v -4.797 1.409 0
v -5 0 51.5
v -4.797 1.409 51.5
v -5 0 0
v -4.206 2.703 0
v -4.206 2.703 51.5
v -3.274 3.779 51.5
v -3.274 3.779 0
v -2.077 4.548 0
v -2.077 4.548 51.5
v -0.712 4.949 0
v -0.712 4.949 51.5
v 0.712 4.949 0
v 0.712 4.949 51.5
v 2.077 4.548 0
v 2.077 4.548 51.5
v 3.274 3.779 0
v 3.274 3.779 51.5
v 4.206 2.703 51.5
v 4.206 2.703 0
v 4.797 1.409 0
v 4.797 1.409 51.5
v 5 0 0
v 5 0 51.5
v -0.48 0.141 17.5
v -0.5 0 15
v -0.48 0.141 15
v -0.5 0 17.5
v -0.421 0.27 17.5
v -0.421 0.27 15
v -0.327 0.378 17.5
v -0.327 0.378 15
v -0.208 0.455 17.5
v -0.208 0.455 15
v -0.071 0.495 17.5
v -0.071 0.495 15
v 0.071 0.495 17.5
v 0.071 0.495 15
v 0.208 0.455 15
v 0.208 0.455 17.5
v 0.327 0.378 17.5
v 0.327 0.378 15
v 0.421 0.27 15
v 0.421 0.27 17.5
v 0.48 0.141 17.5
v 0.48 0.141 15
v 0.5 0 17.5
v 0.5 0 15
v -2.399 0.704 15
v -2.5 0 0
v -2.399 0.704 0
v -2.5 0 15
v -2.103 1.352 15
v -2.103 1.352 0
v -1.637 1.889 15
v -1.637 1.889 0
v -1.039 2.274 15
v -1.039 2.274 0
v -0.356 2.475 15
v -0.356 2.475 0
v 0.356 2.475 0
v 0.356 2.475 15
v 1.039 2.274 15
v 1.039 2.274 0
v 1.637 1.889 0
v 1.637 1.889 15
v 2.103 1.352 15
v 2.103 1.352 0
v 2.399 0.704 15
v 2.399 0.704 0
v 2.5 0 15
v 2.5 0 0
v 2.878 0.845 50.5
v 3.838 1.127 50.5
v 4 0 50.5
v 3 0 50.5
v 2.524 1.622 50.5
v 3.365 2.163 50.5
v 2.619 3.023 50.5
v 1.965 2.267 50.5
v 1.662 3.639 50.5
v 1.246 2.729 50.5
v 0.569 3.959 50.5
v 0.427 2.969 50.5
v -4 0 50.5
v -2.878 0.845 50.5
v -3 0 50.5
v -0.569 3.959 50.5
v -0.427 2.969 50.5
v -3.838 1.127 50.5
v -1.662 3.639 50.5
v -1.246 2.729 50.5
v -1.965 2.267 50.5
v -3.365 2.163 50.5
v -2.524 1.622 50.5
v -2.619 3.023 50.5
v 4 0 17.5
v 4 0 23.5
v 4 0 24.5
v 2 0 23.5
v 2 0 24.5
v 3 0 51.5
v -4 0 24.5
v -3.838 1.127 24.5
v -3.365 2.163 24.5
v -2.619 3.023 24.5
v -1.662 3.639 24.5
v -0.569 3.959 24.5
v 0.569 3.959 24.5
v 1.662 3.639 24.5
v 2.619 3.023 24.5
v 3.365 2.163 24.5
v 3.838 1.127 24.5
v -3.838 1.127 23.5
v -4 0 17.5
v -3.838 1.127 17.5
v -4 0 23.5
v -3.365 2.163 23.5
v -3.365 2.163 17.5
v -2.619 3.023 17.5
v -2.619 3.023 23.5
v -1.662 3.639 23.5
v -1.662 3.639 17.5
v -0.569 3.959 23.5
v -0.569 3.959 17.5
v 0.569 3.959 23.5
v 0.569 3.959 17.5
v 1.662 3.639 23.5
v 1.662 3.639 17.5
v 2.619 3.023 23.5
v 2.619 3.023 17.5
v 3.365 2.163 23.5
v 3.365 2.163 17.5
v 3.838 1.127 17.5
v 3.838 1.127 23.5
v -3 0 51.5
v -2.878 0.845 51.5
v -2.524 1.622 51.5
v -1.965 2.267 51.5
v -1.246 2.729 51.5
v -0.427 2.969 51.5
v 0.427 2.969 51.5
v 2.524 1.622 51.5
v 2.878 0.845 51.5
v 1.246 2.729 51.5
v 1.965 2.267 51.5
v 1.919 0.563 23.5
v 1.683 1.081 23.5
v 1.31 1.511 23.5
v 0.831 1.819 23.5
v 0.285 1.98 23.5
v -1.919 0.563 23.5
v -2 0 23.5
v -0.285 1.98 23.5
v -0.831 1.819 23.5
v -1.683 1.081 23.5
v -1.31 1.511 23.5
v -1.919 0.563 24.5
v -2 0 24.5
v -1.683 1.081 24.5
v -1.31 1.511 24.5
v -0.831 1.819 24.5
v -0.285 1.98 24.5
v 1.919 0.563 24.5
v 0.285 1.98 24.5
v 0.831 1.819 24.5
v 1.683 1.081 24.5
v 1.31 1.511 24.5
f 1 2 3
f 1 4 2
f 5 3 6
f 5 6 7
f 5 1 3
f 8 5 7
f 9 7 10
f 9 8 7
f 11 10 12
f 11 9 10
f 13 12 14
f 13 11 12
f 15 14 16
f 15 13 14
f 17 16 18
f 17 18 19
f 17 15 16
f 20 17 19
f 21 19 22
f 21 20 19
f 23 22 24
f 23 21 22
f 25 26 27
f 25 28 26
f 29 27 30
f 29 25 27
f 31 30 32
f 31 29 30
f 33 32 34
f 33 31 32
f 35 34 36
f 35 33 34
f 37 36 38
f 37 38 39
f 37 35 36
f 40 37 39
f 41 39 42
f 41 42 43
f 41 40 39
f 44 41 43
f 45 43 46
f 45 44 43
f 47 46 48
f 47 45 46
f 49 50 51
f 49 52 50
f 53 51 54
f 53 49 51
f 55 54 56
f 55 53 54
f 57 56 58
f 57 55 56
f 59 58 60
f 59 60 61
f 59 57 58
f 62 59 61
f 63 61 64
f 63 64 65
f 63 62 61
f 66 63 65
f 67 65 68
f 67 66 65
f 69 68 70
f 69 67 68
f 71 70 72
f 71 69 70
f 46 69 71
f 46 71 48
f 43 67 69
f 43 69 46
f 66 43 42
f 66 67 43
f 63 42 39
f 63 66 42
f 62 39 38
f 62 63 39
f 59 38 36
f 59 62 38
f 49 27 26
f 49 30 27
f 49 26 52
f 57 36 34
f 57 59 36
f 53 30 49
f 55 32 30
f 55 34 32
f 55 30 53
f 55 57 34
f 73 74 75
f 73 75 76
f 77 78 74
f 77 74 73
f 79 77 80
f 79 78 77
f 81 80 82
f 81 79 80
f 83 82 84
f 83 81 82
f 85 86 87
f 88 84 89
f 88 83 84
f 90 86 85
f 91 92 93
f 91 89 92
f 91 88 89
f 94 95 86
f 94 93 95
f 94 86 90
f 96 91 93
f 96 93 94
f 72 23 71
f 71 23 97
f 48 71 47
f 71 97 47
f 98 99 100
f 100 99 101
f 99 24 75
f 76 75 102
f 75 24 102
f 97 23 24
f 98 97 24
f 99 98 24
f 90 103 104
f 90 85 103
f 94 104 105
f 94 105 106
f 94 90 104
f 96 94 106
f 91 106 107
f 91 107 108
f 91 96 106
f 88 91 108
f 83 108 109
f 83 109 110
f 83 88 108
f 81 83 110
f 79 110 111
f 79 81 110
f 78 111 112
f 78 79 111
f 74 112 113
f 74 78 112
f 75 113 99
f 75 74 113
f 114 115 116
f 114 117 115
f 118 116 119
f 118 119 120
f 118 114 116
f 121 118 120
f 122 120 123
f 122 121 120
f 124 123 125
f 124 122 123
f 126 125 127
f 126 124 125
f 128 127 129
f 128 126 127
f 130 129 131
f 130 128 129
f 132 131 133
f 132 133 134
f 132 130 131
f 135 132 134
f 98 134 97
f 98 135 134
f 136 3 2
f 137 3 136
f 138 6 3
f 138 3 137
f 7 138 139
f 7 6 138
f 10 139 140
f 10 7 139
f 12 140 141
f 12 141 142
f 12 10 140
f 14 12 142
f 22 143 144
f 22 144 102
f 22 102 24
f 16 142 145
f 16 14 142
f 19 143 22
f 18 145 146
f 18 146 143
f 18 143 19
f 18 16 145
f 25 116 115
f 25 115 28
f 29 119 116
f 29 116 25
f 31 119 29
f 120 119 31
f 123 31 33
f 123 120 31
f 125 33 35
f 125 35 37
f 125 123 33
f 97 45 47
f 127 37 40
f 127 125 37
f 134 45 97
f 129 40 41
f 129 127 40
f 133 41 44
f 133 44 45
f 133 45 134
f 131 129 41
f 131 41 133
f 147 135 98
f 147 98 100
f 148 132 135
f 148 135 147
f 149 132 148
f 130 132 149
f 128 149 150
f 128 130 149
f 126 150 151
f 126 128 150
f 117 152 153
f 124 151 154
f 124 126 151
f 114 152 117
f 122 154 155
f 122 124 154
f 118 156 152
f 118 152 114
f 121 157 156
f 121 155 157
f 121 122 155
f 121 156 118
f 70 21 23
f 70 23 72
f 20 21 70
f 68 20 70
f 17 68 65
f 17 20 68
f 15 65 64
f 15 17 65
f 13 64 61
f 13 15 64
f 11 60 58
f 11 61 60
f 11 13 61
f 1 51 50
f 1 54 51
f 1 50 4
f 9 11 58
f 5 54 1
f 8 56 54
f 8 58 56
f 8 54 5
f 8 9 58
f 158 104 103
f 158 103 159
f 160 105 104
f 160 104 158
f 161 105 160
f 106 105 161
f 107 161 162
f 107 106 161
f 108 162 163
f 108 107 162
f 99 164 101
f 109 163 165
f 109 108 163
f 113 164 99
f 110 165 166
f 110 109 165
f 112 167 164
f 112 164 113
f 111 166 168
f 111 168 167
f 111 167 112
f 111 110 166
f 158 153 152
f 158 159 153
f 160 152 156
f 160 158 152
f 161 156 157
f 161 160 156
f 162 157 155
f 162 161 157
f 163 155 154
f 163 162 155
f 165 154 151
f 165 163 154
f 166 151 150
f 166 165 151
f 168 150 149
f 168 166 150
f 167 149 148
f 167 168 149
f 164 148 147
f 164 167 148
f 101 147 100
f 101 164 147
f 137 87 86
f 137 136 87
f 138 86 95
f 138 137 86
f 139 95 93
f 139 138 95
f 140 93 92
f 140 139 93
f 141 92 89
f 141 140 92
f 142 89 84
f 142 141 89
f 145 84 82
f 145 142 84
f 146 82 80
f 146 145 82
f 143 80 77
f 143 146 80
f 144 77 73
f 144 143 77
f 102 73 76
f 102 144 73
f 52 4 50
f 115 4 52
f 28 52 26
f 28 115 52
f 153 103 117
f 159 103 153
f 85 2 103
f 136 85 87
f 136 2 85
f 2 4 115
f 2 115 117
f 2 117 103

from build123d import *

# Parameters (mm, degrees)
F1_ANGLE = 180


with BuildPart() as f1:
    # F0 (on Front) → F1 (revolve)
    with BuildSketch(Plane.XZ):
        Polygon((-4, 50.5), (-3, 50.5), (-3, 51.5), (-5, 51.5), (-5, 0), (-2.5, 0), (-2.5, 15), (-0.5, 15), (-0.5, 17.5), (-4, 17.5), (-4, 23.5), (-2, 23.5), (-2, 24.5), (-4, 24.5), align=None)
    revolve(axis=Axis((0, 0, 15), (0, 0, -1)), revolution_arc=F1_ANGLE)


solid = f1.part
